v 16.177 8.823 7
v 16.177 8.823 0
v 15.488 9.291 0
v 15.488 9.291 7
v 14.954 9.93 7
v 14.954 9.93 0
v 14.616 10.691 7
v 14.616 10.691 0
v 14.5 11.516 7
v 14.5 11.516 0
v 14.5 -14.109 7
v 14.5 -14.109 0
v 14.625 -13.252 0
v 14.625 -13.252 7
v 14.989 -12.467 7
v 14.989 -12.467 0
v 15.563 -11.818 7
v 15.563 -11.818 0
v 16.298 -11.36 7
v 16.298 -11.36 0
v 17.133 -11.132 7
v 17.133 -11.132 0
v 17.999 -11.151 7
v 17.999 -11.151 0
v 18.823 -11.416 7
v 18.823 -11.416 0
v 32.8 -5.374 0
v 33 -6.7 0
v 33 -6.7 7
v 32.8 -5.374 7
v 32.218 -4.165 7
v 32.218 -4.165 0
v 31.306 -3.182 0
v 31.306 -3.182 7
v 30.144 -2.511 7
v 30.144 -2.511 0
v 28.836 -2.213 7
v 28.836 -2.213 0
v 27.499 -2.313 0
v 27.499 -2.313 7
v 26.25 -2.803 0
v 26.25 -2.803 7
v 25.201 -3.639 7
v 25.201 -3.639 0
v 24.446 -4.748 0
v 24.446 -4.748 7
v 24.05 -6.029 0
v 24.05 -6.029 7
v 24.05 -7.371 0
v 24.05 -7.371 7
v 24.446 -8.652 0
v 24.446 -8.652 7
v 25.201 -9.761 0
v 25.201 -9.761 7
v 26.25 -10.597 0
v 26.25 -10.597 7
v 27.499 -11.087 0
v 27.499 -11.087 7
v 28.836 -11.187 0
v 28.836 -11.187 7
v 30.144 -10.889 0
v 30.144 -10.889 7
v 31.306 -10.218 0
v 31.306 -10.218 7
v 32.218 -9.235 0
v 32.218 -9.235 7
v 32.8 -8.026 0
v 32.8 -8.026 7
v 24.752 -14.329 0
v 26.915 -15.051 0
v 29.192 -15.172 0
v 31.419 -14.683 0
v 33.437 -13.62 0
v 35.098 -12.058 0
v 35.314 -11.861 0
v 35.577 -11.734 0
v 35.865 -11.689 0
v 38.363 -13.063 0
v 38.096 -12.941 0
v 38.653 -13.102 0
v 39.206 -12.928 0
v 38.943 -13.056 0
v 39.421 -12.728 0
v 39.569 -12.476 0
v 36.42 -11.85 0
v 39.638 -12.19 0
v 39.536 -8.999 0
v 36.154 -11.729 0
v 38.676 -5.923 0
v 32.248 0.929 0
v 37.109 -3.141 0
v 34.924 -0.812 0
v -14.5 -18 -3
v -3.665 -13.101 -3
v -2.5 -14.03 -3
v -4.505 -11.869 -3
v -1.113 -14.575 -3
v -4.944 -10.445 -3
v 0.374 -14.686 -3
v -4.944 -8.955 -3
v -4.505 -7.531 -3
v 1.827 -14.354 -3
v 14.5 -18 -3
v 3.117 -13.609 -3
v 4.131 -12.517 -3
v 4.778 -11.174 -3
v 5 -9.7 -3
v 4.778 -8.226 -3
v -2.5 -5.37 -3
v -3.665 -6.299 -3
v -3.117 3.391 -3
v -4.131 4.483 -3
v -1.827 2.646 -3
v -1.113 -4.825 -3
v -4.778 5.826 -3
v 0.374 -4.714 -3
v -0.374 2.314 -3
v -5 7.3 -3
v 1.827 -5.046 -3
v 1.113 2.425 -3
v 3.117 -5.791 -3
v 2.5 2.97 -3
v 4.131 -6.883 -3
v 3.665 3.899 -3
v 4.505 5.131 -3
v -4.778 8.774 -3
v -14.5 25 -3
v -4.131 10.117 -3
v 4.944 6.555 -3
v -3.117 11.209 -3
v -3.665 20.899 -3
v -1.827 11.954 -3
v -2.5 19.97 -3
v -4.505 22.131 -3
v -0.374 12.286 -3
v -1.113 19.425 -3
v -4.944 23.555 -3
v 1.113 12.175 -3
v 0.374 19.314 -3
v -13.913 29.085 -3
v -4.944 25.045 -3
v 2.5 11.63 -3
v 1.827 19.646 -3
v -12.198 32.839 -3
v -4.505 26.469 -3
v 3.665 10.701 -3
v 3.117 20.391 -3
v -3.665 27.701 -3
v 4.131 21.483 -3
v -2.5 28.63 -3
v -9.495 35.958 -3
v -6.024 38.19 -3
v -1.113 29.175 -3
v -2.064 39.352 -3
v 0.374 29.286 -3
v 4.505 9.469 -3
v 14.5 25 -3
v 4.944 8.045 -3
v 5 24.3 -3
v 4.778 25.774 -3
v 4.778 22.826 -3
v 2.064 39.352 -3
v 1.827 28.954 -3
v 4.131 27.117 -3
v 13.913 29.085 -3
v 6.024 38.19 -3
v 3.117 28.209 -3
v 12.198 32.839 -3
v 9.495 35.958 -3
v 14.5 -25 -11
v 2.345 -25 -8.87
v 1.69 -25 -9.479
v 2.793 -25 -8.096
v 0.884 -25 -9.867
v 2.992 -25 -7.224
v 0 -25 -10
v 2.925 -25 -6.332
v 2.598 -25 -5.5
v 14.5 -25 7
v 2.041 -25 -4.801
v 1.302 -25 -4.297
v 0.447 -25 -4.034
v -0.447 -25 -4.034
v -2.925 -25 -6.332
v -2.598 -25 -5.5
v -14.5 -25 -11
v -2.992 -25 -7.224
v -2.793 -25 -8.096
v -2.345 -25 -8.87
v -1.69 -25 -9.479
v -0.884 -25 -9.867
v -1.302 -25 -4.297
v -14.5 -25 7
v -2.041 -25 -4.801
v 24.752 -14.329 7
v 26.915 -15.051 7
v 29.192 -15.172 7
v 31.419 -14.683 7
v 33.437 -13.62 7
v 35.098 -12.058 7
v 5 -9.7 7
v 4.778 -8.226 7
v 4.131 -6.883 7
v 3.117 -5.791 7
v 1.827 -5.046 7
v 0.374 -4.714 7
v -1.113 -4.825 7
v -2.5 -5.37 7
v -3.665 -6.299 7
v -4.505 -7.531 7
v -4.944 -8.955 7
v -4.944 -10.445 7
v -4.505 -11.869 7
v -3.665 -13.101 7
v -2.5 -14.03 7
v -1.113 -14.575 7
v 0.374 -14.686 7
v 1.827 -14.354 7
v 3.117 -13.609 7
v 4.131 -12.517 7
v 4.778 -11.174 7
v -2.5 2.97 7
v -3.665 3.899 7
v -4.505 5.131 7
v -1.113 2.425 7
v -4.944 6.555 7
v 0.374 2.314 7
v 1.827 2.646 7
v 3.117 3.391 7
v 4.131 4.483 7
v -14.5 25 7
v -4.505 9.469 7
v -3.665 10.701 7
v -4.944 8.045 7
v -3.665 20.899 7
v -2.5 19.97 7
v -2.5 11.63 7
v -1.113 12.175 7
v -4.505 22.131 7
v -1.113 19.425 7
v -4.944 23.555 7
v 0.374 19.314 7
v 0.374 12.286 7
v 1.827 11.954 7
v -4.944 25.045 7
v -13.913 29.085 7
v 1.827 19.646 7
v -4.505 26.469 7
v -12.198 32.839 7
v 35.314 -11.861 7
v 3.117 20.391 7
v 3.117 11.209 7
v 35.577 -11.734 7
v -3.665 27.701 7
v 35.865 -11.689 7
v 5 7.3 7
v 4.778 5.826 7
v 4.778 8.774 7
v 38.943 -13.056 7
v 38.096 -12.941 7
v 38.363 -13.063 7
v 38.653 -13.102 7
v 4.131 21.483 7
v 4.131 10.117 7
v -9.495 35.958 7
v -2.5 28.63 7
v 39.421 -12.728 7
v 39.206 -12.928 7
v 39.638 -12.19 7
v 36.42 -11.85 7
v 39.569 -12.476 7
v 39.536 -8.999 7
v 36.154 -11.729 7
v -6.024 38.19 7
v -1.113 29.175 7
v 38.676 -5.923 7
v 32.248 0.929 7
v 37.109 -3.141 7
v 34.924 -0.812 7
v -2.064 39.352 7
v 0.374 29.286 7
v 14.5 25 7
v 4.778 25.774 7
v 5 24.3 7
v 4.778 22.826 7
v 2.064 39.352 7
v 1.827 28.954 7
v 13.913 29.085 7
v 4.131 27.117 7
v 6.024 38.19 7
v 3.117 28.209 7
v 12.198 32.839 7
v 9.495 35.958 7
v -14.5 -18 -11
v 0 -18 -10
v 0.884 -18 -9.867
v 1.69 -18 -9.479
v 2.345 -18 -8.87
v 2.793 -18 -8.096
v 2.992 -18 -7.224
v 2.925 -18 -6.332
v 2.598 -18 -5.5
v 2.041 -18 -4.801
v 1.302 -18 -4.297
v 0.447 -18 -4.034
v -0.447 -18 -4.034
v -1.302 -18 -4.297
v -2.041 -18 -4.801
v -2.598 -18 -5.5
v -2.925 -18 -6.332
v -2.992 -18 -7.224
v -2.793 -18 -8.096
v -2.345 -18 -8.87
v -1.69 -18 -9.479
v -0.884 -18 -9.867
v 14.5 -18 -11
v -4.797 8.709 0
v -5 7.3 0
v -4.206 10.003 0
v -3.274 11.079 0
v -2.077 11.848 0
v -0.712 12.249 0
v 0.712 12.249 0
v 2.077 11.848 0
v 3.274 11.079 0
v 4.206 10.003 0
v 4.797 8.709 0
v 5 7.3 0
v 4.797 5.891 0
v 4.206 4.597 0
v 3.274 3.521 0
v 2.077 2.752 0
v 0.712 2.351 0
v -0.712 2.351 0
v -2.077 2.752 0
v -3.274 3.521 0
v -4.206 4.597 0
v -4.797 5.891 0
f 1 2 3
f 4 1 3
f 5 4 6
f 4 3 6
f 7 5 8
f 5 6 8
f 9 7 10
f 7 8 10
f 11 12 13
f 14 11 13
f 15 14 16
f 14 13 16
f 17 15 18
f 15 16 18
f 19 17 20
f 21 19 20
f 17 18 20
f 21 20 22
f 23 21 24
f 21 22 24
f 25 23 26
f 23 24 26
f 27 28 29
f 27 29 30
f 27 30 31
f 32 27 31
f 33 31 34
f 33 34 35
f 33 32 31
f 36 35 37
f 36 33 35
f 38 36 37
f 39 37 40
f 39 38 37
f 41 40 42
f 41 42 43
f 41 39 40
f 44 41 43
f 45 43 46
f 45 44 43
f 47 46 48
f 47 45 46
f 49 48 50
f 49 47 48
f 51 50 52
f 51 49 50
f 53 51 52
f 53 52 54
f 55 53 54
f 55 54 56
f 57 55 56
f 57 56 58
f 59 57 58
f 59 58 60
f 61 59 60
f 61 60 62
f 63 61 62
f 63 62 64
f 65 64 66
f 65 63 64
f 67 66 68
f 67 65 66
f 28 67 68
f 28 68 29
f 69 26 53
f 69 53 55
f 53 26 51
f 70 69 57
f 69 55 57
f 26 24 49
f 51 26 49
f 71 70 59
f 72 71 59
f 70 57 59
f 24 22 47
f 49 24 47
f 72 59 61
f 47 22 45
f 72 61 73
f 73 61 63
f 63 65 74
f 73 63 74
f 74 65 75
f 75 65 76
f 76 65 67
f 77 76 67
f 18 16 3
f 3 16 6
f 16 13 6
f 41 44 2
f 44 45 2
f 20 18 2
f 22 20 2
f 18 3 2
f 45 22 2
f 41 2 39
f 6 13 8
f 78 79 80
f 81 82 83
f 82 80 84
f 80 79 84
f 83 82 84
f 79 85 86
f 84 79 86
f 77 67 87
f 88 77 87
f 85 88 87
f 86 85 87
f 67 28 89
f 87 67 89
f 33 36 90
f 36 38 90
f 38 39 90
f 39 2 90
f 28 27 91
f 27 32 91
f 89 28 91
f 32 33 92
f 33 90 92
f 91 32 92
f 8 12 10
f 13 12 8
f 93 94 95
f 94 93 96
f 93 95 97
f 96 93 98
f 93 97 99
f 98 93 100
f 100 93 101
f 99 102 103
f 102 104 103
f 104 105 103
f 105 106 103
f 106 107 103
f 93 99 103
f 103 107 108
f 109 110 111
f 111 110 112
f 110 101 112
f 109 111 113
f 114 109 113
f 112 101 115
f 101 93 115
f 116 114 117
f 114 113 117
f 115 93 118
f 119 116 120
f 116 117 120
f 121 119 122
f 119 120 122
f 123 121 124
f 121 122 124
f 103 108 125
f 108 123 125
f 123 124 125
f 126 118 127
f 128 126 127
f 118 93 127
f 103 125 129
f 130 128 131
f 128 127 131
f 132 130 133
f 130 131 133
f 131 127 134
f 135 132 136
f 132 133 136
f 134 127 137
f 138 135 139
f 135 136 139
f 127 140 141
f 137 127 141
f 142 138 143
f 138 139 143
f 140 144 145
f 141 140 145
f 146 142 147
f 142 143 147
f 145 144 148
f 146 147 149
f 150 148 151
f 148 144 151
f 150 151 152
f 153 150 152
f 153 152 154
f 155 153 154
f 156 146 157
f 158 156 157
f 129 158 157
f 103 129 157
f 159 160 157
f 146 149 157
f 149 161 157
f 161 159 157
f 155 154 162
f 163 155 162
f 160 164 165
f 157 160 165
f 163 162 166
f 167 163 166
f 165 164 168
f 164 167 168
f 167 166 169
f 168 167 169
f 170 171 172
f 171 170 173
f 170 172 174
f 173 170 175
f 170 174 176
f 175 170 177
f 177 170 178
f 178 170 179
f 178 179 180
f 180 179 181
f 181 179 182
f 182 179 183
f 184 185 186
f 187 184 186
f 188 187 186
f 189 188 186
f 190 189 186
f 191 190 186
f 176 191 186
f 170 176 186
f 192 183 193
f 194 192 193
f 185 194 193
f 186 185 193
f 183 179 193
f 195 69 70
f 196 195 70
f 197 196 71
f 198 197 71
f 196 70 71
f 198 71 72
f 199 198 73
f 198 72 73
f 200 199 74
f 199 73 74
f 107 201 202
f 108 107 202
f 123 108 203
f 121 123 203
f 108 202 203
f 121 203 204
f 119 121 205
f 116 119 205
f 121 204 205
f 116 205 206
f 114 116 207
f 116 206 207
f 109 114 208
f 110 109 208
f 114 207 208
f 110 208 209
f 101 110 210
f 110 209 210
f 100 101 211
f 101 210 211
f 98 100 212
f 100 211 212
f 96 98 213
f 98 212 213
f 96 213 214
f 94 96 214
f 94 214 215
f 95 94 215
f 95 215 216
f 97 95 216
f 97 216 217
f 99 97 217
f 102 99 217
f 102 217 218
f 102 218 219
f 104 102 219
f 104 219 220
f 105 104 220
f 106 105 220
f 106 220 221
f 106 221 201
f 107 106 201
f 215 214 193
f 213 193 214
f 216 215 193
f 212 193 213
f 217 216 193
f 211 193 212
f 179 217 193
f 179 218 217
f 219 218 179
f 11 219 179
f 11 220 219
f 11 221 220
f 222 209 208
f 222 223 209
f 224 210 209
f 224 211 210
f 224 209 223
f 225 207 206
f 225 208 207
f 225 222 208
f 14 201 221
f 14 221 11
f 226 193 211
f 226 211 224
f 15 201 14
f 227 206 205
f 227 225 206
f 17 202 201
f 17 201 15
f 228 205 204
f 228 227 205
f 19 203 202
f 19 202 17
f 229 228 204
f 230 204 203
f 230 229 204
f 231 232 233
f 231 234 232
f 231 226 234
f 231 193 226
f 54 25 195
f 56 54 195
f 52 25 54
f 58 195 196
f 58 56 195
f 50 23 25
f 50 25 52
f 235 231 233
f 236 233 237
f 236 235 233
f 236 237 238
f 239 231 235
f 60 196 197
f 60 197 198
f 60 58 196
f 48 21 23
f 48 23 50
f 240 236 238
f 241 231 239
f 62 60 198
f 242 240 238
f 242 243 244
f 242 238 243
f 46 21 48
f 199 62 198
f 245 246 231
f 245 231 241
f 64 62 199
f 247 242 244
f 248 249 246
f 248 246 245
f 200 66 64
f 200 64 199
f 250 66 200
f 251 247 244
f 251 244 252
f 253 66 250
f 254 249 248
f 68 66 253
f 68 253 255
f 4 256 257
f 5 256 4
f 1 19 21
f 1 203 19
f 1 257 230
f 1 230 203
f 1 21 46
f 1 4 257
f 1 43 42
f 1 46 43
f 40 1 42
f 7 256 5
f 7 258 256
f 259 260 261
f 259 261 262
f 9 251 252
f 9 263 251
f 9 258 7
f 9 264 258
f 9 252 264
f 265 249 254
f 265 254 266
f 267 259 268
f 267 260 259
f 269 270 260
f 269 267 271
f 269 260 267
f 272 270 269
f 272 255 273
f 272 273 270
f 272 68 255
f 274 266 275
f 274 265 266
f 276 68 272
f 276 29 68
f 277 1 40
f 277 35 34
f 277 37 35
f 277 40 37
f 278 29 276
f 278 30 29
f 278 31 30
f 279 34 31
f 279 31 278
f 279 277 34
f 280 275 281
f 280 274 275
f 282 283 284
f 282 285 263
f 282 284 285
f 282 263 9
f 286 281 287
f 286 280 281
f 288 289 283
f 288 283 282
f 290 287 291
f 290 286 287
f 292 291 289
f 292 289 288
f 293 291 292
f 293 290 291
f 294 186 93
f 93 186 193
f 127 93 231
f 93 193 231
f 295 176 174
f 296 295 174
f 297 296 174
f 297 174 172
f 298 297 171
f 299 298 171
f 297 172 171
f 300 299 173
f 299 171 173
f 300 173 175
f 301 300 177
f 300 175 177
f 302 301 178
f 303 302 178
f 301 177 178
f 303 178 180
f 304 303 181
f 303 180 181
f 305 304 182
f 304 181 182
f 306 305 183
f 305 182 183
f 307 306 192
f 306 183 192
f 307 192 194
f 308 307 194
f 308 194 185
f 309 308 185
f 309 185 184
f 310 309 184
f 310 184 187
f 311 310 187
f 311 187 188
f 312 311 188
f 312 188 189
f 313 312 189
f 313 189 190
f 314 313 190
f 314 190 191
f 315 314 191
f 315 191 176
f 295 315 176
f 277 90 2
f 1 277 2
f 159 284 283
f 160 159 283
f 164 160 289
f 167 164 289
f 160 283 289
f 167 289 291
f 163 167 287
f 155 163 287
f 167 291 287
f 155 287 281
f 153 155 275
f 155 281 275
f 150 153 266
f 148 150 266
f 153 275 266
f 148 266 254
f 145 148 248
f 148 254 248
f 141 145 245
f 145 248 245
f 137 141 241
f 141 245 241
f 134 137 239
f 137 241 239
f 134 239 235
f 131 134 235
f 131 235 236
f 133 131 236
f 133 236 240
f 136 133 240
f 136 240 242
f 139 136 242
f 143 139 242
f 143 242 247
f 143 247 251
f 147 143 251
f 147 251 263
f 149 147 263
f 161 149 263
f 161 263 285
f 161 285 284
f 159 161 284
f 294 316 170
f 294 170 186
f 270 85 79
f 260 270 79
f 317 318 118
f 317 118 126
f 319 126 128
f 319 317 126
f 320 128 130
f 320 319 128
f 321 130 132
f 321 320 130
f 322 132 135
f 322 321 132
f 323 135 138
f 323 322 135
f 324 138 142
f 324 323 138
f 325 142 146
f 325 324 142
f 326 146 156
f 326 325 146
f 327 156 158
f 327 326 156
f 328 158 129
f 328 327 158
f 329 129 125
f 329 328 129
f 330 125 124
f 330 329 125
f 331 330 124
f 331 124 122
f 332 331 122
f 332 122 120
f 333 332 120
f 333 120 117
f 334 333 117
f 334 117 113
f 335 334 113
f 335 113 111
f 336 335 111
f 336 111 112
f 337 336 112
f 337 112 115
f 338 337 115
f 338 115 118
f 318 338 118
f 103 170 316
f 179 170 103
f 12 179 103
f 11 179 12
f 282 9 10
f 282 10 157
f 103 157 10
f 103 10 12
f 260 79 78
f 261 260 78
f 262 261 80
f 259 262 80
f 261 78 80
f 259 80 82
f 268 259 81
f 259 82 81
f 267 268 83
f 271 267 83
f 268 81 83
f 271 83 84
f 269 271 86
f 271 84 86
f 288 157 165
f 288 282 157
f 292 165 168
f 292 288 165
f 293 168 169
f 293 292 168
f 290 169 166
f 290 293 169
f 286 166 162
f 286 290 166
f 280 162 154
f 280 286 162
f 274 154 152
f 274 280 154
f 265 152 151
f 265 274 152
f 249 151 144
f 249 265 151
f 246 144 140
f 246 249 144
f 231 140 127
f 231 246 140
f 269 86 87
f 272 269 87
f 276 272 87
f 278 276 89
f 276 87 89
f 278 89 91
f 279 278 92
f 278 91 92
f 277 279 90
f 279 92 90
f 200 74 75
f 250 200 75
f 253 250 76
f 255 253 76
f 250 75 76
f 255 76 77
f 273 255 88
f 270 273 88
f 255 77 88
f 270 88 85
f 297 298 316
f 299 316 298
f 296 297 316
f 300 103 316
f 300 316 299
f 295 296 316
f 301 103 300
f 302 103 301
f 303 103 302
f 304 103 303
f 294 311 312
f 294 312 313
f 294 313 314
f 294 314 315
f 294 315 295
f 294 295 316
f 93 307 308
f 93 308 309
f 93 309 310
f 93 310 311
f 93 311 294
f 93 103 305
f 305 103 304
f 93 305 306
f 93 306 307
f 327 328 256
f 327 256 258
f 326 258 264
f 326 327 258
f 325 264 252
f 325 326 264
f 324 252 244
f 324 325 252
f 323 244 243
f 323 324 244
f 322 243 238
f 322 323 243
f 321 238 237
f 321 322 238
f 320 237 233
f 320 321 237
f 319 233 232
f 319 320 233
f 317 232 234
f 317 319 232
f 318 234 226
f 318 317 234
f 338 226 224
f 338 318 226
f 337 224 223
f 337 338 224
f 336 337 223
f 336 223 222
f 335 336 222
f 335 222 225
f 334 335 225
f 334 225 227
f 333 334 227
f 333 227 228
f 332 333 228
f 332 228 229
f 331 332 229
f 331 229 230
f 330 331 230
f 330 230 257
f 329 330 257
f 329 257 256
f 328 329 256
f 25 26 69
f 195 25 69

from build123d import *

# Parameters (mm, degrees)
ESQUISSE1_R             = 5
ESQUISSE1_R_2           = 4.5
BOSS_EXTRU_1_DEPTH      = 7
ESQUISSE4_R             = 5
BOSS_EXTRU_3_DEPTH      = 3
ESQUISSE5_W             = 29
ESQUISSE5_H             = 7
BOSS_EXTRU_4_DEPTH      = 8
ESQUISSE6_R             = 3
ENL_V_MAT_EXTRU_1_DEPTH = 65.5
ESQUISSE8_R             = 5
ENL_V_MAT_EXTRU_2_DEPTH = 19


with BuildPart() as part:
    # Esquisse1 → Boss.-Extru.1 (new body)
    with BuildSketch(Plane.XY):
        with BuildLine():
            Line((-14.5, -25), (14.5, -25))
            Line((14.5, -25), (14.5, -14.109086144))
            ThreePointArc((14.5, -14.109086144), (15.91383086, -11.562702933), (18.822711639, -11.416423165))
            Line((18.822711639, -11.416423165), (24.752317023, -14.329211775))
            ThreePointArc((24.752317023, -14.329211775), (30.322333643, -15.002355093), (35.098387692, -12.05829076))
            ThreePointArc((35.098387692, -12.05829076), (35.719225888, -11.700832999), (36.419839787, -11.850353167))
            Line((36.419839787, -11.850353167), (38.096489271, -12.940695548))
            ThreePointArc((38.096489271, -12.940695548), (39.079315926, -13.001513562), (39.637771245, -12.190480443))
            ThreePointArc((39.637771245, -12.190480443), (37.976265411, -4.485178535), (32.247682977, 0.929211775))
            Line((32.247682977, 0.929211775), (16.177288361, 8.823440709))
            ThreePointArc((16.177288361, 8.823440709), (14.953616789, 9.929934548), (14.5, 11.516103688))
            Line((14.5, 11.516103688), (14.5, 25))
            ThreePointArc((14.5, 25), (0, 39.5), (-14.5, 25))
            Line((-14.5, 25), (-14.5, -25))
        make_face()
        with Locations((0, 7.3)):
            Circle(ESQUISSE1_R, mode=Mode.SUBTRACT)
        with Locations((28.5, -6.7)):
            Circle(ESQUISSE1_R_2, mode=Mode.SUBTRACT)
    extrude(amount=BOSS_EXTRU_1_DEPTH)

    # Esquisse4 → Boss.-Extru.3 (add)
    with BuildSketch(Plane(origin=(0, 0, 0), x_dir=(-1, 0, 0), z_dir=(0, 0, -1))):
        with BuildLine():
            Line((14.5, 25), (14.5, -25))
            Line((14.5, -25), (-14.5, -25))
            Line((-14.5, -25), (-14.5, 25))
            ThreePointArc((-14.5, 25), (0, 39.5), (14.5, 25))
        make_face()
        with Locations((0, 7.3)):
            Circle(ESQUISSE4_R, mode=Mode.SUBTRACT)
    extrude(amount=BOSS_EXTRU_3_DEPTH)

    # Esquisse5 → Boss.-Extru.4 (add)
    with BuildSketch(Plane(origin=(0, 0, -3), x_dir=(-1, 0, 0), z_dir=(0, 0, -1))):
        with Locations((0, -21.5)):
            Rectangle(ESQUISSE5_W, ESQUISSE5_H)
    extrude(amount=BOSS_EXTRU_4_DEPTH)

    # Esquisse6 → Enlèv. mat.-Extru.1 (cut, through all)
    with BuildSketch(Plane.XZ.offset(25)):
        with Locations(Location((0, -7, 0), (0, 0, 270))):  # turned: the seam where the file's is
            Circle(ESQUISSE6_R)
    extrude(amount=-ENL_V_MAT_EXTRU_1_DEPTH, mode=Mode.SUBTRACT)

    # Esquisse8 → Enlèv. mat.-Extru.2 (cut, through all)
    with BuildSketch(Plane.XY.offset(7)):
        with Locations((0, -9.7)):
            Circle(ESQUISSE8_R)
        with Locations((0, 24.3)):
            Circle(ESQUISSE8_R)
    extrude(amount=-ENL_V_MAT_EXTRU_2_DEPTH, mode=Mode.SUBTRACT)


solid = part.part
